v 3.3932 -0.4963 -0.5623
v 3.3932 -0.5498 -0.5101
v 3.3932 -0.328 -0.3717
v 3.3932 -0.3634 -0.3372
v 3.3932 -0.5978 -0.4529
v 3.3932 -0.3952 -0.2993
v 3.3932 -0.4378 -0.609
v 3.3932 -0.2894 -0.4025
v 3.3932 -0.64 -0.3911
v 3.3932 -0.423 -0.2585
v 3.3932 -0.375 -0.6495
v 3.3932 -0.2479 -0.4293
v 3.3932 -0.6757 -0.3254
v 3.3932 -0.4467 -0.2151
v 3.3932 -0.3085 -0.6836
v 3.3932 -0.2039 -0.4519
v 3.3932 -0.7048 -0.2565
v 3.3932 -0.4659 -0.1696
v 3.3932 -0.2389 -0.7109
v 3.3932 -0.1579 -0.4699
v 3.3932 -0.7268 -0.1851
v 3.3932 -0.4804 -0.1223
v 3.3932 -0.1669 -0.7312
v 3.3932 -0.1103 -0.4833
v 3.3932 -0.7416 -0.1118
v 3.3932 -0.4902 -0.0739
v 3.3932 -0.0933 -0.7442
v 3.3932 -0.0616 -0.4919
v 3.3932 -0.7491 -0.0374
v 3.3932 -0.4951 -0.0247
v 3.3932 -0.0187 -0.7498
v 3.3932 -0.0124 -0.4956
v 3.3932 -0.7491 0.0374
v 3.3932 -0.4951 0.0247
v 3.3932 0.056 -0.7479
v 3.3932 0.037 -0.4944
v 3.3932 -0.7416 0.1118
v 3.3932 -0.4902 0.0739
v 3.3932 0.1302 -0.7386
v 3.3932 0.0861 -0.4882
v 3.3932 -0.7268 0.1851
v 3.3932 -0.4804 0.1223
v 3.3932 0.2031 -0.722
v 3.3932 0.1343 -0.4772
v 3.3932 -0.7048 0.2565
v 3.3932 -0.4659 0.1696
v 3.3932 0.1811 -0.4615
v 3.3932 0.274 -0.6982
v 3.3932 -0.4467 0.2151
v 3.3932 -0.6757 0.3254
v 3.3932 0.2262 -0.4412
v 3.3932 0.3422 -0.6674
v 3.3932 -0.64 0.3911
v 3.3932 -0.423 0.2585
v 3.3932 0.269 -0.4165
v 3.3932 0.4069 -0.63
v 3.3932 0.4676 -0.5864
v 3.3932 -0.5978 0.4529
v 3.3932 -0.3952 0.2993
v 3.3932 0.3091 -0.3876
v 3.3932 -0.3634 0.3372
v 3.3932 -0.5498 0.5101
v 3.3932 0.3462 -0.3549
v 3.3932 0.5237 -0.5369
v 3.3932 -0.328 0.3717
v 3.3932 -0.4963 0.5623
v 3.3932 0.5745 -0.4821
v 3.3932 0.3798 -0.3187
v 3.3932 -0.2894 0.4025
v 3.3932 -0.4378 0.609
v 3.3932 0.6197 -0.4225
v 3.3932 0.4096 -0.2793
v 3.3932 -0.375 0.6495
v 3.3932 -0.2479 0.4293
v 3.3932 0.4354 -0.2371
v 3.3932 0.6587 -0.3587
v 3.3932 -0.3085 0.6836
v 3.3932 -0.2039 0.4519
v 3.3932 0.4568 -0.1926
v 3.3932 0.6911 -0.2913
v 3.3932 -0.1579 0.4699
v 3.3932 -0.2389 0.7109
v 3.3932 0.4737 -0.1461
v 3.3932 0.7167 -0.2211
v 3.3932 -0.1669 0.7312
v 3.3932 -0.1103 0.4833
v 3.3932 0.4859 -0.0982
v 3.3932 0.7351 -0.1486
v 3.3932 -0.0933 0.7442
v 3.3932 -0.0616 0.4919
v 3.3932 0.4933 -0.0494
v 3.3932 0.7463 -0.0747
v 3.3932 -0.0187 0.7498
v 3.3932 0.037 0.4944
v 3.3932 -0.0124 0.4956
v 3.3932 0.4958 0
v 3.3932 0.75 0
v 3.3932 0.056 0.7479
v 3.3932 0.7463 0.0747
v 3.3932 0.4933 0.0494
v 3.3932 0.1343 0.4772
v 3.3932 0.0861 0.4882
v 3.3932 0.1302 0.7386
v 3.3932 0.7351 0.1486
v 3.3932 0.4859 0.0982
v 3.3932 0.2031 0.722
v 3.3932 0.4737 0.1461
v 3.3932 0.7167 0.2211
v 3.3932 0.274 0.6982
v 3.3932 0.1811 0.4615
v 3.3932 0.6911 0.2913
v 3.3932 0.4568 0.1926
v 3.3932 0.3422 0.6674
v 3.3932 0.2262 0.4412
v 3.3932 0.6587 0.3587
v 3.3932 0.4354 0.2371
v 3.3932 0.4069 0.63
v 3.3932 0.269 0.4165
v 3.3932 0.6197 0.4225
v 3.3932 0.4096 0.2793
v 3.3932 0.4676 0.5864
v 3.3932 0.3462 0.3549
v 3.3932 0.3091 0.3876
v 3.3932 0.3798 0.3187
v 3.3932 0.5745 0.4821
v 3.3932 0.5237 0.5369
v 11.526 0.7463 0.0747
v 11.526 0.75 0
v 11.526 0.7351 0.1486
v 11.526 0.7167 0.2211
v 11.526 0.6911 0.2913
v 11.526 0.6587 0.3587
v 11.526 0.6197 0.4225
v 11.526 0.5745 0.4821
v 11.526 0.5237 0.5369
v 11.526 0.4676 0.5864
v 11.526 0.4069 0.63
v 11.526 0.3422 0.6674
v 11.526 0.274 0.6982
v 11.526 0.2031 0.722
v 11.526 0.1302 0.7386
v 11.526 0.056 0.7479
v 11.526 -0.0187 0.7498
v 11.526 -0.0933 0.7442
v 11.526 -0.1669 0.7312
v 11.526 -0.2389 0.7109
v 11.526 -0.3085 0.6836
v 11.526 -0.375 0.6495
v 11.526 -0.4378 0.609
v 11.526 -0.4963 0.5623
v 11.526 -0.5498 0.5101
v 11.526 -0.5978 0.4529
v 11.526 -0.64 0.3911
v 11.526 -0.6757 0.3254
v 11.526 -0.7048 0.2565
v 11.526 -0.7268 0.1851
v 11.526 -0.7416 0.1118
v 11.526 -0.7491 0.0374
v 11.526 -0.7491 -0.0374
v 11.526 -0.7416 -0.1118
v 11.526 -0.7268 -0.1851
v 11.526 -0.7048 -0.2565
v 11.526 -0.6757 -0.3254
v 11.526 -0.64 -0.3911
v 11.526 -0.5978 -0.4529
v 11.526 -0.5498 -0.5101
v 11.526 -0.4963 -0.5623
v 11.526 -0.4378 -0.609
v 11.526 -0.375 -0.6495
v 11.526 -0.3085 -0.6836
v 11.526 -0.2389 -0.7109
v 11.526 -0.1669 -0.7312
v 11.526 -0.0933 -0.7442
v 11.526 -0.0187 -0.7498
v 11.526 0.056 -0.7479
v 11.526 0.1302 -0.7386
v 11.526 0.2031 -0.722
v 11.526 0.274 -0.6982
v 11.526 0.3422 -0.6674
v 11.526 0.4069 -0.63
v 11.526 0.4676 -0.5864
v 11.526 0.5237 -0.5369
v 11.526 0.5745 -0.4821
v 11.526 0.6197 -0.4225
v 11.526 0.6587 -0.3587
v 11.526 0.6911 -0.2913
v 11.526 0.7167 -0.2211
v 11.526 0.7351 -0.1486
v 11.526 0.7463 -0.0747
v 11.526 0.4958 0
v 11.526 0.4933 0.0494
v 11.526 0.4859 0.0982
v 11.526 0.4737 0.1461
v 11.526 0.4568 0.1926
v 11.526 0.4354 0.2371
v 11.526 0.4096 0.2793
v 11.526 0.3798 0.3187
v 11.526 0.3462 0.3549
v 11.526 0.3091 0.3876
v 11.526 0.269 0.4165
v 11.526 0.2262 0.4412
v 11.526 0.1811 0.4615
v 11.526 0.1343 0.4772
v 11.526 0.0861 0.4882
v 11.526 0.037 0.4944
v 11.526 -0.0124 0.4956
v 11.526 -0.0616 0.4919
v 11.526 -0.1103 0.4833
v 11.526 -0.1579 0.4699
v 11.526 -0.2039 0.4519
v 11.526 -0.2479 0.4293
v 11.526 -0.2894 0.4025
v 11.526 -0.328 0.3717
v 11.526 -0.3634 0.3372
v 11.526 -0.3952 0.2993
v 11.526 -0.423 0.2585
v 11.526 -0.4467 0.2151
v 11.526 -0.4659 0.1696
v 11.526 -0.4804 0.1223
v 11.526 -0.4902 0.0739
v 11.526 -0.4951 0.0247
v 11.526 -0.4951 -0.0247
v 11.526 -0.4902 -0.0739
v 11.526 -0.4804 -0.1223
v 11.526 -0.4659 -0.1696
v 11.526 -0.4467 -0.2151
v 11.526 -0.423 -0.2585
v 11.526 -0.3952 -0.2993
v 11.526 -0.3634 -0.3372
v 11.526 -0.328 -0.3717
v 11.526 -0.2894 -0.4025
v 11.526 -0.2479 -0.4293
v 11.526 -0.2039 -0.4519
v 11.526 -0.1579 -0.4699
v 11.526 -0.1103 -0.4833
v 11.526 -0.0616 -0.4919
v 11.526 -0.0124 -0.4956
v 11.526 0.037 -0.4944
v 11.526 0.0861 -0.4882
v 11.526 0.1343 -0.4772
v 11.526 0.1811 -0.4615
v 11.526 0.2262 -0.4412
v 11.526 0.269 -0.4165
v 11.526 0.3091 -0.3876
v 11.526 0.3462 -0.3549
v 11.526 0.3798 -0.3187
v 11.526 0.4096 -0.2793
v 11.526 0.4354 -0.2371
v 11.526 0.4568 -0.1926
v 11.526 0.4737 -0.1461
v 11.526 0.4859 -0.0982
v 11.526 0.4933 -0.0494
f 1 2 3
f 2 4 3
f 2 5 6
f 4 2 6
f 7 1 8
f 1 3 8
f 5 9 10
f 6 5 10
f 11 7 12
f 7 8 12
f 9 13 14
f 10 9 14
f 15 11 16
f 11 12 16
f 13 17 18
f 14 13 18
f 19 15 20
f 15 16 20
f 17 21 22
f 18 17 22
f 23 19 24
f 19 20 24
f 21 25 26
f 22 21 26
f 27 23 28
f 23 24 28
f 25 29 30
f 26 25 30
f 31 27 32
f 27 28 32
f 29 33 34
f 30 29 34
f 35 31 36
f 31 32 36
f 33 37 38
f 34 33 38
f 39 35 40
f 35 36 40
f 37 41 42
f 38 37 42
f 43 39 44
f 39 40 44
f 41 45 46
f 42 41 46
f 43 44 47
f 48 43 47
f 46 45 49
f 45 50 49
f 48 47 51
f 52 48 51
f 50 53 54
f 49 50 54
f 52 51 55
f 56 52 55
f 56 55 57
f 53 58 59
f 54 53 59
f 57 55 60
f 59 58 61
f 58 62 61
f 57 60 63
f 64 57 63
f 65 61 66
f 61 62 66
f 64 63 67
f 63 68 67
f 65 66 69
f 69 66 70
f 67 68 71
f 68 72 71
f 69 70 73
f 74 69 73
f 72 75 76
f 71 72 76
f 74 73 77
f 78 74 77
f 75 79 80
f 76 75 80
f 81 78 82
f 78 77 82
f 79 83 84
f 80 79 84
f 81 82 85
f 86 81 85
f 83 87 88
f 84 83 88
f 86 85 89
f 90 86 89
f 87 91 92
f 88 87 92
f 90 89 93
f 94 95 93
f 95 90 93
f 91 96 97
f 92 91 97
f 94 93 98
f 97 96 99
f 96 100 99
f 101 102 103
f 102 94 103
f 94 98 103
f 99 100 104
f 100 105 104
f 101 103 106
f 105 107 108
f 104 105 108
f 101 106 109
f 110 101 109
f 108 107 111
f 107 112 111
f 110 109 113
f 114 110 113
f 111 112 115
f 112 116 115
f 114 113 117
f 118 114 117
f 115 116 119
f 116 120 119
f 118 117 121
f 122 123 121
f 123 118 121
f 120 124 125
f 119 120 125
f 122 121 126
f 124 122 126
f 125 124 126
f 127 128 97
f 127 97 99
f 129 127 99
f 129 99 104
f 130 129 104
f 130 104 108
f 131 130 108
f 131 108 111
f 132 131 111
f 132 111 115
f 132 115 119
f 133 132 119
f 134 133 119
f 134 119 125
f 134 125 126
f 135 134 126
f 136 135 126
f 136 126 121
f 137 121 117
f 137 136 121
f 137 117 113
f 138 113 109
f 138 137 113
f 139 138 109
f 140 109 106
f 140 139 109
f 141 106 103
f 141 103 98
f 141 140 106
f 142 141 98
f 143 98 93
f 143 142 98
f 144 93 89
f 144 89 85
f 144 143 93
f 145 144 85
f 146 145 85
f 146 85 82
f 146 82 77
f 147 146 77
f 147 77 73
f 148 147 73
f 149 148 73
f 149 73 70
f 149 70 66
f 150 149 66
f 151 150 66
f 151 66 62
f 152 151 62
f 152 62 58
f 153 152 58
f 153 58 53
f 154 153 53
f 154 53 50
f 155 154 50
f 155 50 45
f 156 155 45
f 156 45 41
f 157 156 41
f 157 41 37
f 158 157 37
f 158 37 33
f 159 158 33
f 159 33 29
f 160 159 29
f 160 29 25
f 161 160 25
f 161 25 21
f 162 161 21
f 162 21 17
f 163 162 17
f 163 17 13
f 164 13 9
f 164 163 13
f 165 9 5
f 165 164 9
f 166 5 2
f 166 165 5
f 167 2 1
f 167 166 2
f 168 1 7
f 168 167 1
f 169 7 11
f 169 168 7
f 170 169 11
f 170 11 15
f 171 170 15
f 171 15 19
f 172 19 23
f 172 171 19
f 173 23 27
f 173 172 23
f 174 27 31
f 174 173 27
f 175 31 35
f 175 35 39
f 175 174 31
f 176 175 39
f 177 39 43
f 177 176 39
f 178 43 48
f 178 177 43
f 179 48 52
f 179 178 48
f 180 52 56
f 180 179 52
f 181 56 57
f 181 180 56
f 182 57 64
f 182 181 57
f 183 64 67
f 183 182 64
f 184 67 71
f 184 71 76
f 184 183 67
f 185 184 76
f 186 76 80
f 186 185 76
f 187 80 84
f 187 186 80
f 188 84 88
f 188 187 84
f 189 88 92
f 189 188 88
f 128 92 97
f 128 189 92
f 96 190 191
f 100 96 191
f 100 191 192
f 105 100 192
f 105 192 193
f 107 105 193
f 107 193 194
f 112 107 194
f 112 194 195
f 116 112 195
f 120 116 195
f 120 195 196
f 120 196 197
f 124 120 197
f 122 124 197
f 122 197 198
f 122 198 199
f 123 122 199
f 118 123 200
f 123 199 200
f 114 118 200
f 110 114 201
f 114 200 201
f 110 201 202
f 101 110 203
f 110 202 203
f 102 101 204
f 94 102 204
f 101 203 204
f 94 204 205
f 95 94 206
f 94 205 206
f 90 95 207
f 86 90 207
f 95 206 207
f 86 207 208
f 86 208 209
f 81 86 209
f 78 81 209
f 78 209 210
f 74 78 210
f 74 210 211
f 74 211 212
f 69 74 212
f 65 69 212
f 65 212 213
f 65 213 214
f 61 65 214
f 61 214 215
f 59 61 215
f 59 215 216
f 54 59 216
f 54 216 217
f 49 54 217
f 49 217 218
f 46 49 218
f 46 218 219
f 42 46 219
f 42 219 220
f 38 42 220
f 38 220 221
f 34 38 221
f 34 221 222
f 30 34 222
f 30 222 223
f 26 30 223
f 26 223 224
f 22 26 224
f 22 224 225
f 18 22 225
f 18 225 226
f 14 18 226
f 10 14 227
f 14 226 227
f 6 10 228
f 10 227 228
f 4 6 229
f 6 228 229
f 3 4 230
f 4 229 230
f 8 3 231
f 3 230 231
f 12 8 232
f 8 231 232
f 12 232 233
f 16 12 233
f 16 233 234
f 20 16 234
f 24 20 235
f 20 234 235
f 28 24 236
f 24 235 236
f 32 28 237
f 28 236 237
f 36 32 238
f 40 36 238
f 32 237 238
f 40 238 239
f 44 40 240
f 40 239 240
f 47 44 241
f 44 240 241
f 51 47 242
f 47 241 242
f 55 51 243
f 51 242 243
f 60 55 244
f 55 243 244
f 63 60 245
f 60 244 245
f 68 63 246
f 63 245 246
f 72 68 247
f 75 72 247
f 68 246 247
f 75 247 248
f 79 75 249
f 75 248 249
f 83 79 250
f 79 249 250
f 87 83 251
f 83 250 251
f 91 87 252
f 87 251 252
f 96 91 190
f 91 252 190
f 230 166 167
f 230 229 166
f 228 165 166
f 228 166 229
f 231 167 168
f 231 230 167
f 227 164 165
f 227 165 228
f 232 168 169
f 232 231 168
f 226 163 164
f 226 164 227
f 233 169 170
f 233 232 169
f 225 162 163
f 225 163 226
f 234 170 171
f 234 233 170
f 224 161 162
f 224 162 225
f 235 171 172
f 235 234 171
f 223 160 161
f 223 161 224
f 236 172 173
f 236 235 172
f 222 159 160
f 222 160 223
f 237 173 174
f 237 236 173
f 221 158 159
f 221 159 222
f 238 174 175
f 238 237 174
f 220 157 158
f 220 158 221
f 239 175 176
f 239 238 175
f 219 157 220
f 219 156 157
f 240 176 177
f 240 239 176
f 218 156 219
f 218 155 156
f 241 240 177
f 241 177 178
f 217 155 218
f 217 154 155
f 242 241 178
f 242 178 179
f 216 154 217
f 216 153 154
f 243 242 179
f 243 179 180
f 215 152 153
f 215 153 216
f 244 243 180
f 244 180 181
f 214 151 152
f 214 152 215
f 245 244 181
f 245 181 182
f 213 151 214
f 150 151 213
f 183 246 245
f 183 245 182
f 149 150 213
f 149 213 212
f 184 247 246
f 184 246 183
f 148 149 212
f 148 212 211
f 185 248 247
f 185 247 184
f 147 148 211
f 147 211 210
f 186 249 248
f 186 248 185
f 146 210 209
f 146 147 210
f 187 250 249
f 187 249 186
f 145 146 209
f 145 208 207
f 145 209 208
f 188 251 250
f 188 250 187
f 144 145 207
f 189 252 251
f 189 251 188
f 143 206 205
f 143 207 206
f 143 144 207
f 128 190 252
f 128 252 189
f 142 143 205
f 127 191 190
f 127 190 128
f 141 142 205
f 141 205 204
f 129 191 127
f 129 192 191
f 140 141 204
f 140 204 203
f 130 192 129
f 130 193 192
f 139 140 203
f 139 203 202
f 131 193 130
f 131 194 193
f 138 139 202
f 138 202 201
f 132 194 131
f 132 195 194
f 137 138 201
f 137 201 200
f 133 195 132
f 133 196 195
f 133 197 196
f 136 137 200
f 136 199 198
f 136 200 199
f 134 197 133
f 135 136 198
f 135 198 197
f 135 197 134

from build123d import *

# Parameters (mm, degrees)
PAD_DEPTH       = 0.245
POCKET_DEPTH    = 0.05
SKETCH004_R     = 0.75
PAD001_DEPTH    = 10.08525
SKETCH005_R     = 3
HOLE_DEPTH      = 26
SKETCH006_R     = 0.495763
POCKET001_DEPTH = 9.580987
SKETCH007_W     = 15
SKETCH007_H     = 15
POCKET002_DEPTH = 5


with BuildPart() as part:
    # Sketch → Pad (new body, symmetric)
    with BuildSketch(Plane.XY):
        with BuildLine():
            Line((0, 0.375), (19.21, 0.375))
            ThreePointArc((19.21, -0.375), (19.585, 0), (19.21, 0.375))
            Line((19.21, -0.375), (0, -0.375))
            ThreePointArc((0, 0.375), (-0.375, 0), (0, -0.375))
        make_face()
    extrude(amount=PAD_DEPTH, both=True)

    # Sketch001 → Revolution (revolve)
    with BuildSketch(Plane.XY):
        with BuildLine():
            Line((0, 0.625), (0, 0))
            Line((0, 0), (0, -0.625))
            ThreePointArc((0, 0.625), (-0.625, 0), (0, -0.625))
        make_face()
    revolve(axis=Axis((0, 0, 0), (0, -1, 0)))

    # Sketch002 → Revolution001 (revolve)
    with BuildSketch(Plane.XY):
        with BuildLine():
            ThreePointArc((19.21, -0.625), (19.835, 0), (19.21, 0.625))
            Line((19.21, 0.625), (19.21, 0))
            Line((19.21, 0), (19.21, -0.625))
        make_face()
    revolve(axis=Axis((19.21, 0, 0), (0, -1, 0)))

    # Sketch003 (on DatumPlane) → Pocket (cut)
    with BuildSketch(Plane.XY.offset(0.25)):
        Polygon((1.05425, -0.16238), (1.148, 0), (1.05425, 0.16238), (0.86675, 0.16238), (0.773, 0), (0.86675, -0.16238), align=None)
    extrude(amount=-POCKET_DEPTH, mode=Mode.SUBTRACT)

    # Sketch004 (on DatumPlane) → Pad001 (join)
    with BuildSketch(Plane.YZ.offset(11.526)):
        Circle(SKETCH004_R)
    extrude(amount=-PAD001_DEPTH)

    # Sketch005 (on DatumPlane) → Hole (cut)
    with BuildSketch(Plane.YZ.offset(11.526)):
        Circle(SKETCH005_R)
    extrude(amount=HOLE_DEPTH, mode=Mode.SUBTRACT)

    # Sketch006 (on DatumPlane) → Pocket001 (cut)
    with BuildSketch(Plane.YZ.offset(11.526)):
        Circle(SKETCH006_R)
    extrude(amount=-POCKET001_DEPTH, mode=Mode.SUBTRACT)

    # Sketch007 (on DatumPlane) → Pocket002 (cut)
    with BuildSketch(Plane.YZ.offset(3.3932)):
        Rectangle(SKETCH007_W, SKETCH007_H)
    extrude(amount=-POCKET002_DEPTH, mode=Mode.SUBTRACT)


solid = part.part
